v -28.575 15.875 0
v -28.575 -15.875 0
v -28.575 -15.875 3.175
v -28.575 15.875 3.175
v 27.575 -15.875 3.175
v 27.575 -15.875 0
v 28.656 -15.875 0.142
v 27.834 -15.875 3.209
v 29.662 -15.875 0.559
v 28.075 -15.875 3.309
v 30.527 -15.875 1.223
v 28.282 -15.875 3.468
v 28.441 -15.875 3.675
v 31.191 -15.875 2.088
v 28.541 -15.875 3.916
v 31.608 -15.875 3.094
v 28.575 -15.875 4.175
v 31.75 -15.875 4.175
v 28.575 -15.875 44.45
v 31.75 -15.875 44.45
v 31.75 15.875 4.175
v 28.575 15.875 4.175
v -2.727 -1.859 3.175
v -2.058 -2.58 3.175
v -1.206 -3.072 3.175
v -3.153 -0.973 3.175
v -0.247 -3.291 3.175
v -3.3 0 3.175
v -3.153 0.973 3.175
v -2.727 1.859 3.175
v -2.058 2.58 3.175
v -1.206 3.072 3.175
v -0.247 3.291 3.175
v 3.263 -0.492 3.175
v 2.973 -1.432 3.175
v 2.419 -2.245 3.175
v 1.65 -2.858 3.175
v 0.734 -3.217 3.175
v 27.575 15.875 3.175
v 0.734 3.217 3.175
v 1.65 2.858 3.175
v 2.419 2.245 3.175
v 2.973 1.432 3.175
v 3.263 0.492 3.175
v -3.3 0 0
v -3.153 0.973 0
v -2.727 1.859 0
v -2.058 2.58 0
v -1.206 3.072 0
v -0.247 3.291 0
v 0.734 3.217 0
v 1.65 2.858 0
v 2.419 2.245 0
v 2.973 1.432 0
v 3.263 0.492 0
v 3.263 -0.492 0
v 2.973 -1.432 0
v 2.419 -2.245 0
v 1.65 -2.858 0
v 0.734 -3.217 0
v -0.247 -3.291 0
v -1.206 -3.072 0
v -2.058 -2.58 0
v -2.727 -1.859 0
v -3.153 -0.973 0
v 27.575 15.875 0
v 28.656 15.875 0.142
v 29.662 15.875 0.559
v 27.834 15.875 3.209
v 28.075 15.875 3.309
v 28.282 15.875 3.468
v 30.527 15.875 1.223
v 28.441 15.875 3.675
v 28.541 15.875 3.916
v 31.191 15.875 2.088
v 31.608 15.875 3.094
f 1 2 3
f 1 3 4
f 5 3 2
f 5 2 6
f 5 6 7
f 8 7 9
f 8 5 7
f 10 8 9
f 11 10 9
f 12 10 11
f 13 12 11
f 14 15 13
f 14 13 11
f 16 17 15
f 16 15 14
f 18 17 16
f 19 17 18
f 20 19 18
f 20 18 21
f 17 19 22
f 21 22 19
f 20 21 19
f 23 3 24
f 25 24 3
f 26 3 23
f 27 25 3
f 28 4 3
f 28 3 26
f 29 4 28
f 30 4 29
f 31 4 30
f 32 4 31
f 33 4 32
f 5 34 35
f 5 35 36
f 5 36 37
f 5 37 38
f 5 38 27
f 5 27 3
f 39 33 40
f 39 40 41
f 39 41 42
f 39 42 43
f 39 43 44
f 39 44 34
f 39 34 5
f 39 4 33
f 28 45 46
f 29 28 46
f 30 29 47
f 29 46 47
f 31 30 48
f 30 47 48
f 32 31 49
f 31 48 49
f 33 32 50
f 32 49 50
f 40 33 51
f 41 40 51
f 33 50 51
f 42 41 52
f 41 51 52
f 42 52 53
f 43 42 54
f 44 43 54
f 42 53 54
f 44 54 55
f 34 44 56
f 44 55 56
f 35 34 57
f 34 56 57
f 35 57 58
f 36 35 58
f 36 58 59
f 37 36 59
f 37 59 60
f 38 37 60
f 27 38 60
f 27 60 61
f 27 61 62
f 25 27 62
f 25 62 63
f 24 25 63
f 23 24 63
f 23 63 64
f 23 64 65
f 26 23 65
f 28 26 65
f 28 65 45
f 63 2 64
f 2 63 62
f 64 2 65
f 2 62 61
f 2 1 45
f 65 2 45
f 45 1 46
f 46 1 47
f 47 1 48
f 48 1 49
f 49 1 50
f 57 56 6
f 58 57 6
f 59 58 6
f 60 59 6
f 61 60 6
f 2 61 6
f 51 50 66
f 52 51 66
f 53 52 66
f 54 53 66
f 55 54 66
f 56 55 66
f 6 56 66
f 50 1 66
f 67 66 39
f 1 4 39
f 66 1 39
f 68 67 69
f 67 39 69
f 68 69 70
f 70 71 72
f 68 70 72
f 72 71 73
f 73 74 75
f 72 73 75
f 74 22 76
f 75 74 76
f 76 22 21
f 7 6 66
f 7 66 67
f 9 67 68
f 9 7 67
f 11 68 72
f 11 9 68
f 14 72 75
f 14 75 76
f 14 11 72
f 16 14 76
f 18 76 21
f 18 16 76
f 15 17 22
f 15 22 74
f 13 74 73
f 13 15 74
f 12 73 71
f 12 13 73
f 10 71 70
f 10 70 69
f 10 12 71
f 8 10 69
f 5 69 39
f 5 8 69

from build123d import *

# Parameters (mm, degrees)
SKETCH2_W                    = 57.15
SKETCH2_H                    = 31.75
BASE_FLANGE1_DEPTH           = 3.175
EDGE_FLANGE1_STRIP_W         = 14.7
EDGE_FLANGE1_STRIP_H         = 3.175
EDGE_FLANGE1_STRIP_CUT_DEPTH = 31.75
EDGE_FLANGE1_DEPTH           = 31.75
CUT_EXTRUDE1_DEPTH           = 77.59584682
CUT_EXTRUDE1_DEPTH_BACK      = 3.175
M6_CLEARANCE_HOLE1_D         = 6.6


# Sheet-metal steps are written as plain solids
with BuildPart() as part:
    # Sketch2 → Base-Flange1 (new body)
    with BuildSketch(Plane.XY):
        Rectangle(SKETCH2_W, SKETCH2_H)
    extrude(amount=BASE_FLANGE1_DEPTH)

    # Edge-Flange1 strip (across the edge) → Edge-Flange1 strip cut (cut)
    with BuildSketch(Plane(origin=(28.575, -15.875, 3.175), x_dir=(-1, 0, 0), z_dir=(0, 1, 0))):
        with Locations((-6.35, -1.5875)):
            Rectangle(EDGE_FLANGE1_STRIP_W, EDGE_FLANGE1_STRIP_H)
    extrude(amount=EDGE_FLANGE1_STRIP_CUT_DEPTH, mode=Mode.SUBTRACT)

    # Edge-Flange1 section (across the edge) → Edge-Flange1 (add)
    with BuildSketch(Plane(origin=(28.575, -15.875, 3.175), x_dir=(-1, 0, 0), z_dir=(0, 1, 0))):
        with BuildLine():
            Line((-3.175, 1), (-3.175, 41.275))
            Line((-3.175, 41.275), (0, 41.275))
            Line((0, 41.275), (0, 1))
            ThreePointArc((0, 1), (0.292893219, 0.292893219), (1, 0))
            Line((1, 0), (1, -3.175))
            ThreePointArc((1, -3.175), (-1.952170811, -1.952170811), (-3.175, 1))
        make_face()
    extrude(amount=EDGE_FLANGE1_DEPTH)

    # Sketch10 → Cut-Extrude1 (cut, two sides: drawn at the far end of the back side and taken through both)
    with BuildSketch(Plane(origin=(31.75, 0, 0), x_dir=(0, 0, -1), z_dir=(1, 0, 0)).offset(-CUT_EXTRUDE1_DEPTH_BACK)):
        Polygon((-4.175, 15.875), (-44.45, -15.875), (-44.45, 15.875), align=None)
    extrude(amount=CUT_EXTRUDE1_DEPTH + CUT_EXTRUDE1_DEPTH_BACK, mode=Mode.SUBTRACT)

    # M6 Clearance Hole1 (through all)
    with Locations(Plane.XY.offset(3.175)):
        with Locations((0, 0)):
            Hole(M6_CLEARANCE_HOLE1_D / 2)


solid = part.part
